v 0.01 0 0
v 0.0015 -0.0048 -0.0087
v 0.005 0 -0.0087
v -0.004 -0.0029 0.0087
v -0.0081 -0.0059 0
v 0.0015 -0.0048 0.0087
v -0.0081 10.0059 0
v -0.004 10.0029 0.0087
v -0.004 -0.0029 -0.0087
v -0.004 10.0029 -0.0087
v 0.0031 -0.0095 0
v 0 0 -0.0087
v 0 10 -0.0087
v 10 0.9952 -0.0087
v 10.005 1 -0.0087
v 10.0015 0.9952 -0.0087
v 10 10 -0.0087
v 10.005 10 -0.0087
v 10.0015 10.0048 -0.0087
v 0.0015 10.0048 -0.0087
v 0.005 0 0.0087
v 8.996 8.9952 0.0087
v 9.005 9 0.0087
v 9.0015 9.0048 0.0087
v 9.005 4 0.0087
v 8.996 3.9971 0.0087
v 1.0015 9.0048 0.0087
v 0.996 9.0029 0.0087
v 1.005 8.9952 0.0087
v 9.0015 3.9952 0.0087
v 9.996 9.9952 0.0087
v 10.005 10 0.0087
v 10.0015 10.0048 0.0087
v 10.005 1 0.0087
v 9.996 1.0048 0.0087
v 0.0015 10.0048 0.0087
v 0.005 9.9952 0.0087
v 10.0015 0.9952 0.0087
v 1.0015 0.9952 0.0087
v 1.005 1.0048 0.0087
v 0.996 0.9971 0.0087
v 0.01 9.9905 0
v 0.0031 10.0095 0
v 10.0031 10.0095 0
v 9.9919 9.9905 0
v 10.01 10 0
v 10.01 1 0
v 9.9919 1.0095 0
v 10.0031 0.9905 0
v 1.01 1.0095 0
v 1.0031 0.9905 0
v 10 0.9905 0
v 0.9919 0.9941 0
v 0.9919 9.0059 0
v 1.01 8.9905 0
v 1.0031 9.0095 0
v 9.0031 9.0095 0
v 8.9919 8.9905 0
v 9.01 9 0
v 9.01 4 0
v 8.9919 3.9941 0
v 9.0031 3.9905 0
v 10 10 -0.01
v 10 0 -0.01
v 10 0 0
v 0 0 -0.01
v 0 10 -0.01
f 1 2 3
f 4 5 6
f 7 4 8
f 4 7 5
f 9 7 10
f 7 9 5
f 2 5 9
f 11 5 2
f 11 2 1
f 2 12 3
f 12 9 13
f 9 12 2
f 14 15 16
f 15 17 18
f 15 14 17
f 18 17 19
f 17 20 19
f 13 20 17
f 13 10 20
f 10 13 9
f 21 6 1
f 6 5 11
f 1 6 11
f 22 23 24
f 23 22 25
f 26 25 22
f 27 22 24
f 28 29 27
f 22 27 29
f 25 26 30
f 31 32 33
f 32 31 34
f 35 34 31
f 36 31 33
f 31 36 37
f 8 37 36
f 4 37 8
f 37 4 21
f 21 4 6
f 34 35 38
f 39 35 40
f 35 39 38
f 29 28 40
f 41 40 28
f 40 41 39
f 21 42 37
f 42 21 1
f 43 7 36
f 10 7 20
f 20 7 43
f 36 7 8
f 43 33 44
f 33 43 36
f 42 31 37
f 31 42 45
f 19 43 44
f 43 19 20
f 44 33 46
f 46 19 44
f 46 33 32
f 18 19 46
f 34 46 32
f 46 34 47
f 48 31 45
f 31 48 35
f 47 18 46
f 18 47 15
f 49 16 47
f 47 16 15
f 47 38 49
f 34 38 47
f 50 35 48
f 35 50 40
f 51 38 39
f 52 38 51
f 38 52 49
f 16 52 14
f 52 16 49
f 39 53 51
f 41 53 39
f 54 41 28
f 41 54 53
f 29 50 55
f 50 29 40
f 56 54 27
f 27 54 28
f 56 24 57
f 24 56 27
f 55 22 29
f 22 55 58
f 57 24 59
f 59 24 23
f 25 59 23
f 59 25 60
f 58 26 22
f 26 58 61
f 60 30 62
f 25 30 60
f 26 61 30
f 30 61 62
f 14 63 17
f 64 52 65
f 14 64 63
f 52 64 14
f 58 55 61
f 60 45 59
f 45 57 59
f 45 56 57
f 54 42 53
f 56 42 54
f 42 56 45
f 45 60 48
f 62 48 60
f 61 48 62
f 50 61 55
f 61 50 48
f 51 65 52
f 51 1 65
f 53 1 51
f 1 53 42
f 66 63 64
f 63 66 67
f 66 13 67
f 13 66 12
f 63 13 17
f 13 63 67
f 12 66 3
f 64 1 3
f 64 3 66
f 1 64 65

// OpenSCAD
hull(){
    translate([0.0, 0.0]) sphere(0.01);
    translate([0.0, 1.0]) sphere(0.01);
}
hull(){
    translate([0.0, 1.0]) sphere(0.01);
    translate([0.0, 2.0]) sphere(0.01);
}
hull(){
    translate([0.0, 2.0]) sphere(0.01);
    translate([0.0, 3.0]) sphere(0.01);
}
hull(){
    translate([0.0, 3.0]) sphere(0.01);
    translate([0.0, 4.0]) sphere(0.01);
}
hull(){
    translate([0.0, 4.0]) sphere(0.01);
    translate([0.0, 5.0]) sphere(0.01);
}
hull(){
    translate([0.0, 5.0]) sphere(0.01);
    translate([0.0, 6.0]) sphere(0.01);
}
hull(){
    translate([0.0, 6.0]) sphere(0.01);
    translate([0.0, 7.0]) sphere(0.01);
}
hull(){
    translate([0.0, 7.0]) sphere(0.01);
    translate([0.0, 8.0]) sphere(0.01);
}
hull(){
    translate([0.0, 8.0]) sphere(0.01);
    translate([0.0, 9.0]) sphere(0.01);
}
hull(){
    translate([0.0, 9.0]) sphere(0.01);
    translate([0.0, 10.0]) sphere(0.01);
}
hull(){
    translate([0.0, 10.0]) sphere(0.01);
    translate([1.0, 10.0]) sphere(0.01);
}
hull(){
    translate([1.0, 10.0]) sphere(0.01);
    translate([2.0, 10.0]) sphere(0.01);
}
hull(){
    translate([2.0, 10.0]) sphere(0.01);
    translate([3.0, 10.0]) sphere(0.01);
}
hull(){
    translate([3.0, 10.0]) sphere(0.01);
    translate([4.0, 10.0]) sphere(0.01);
}
hull(){
    translate([4.0, 10.0]) sphere(0.01);
    translate([5.0, 10.0]) sphere(0.01);
}
hull(){
    translate([5.0, 10.0]) sphere(0.01);
    translate([6.0, 10.0]) sphere(0.01);
}
hull(){
    translate([6.0, 10.0]) sphere(0.01);
    translate([7.0, 10.0]) sphere(0.01);
}
hull(){
    translate([7.0, 10.0]) sphere(0.01);
    translate([8.0, 10.0]) sphere(0.01);
}
hull(){
    translate([8.0, 10.0]) sphere(0.01);
    translate([9.0, 10.0]) sphere(0.01);
}
hull(){
    translate([9.0, 10.0]) sphere(0.01);
    translate([10.0, 10.0]) sphere(0.01);
}
hull(){
    translate([10.0, 10.0]) sphere(0.01);
    translate([10.0, 9.0]) sphere(0.01);
}
hull(){
    translate([10.0, 9.0]) sphere(0.01);
    translate([10.0, 8.0]) sphere(0.01);
}
hull(){
    translate([10.0, 8.0]) sphere(0.01);
    translate([10.0, 7.0]) sphere(0.01);
}
hull(){
    translate([10.0, 7.0]) sphere(0.01);
    translate([10.0, 6.0]) sphere(0.01);
}
hull(){
    translate([10.0, 6.0]) sphere(0.01);
    translate([10.0, 5.0]) sphere(0.01);
}
hull(){
    translate([10.0, 5.0]) sphere(0.01);
    translate([10.0, 4.0]) sphere(0.01);
}
hull(){
    translate([10.0, 4.0]) sphere(0.01);
    translate([10.0, 3.0]) sphere(0.01);
}
hull(){
    translate([10.0, 3.0]) sphere(0.01);
    translate([10.0, 2.0]) sphere(0.01);
}
hull(){
    translate([10.0, 2.0]) sphere(0.01);
    translate([10.0, 1.0]) sphere(0.01);
}
hull(){
    translate([10.0, 1.0]) sphere(0.01);
    translate([9.0, 1.0]) sphere(0.01);
}
hull(){
    translate([9.0, 1.0]) sphere(0.01);
    translate([8.0, 1.0]) sphere(0.01);
}
hull(){
    translate([8.0, 1.0]) sphere(0.01);
    translate([7.0, 1.0]) sphere(0.01);
}
hull(){
    translate([7.0, 1.0]) sphere(0.01);
    translate([6.0, 1.0]) sphere(0.01);
}
hull(){
    translate([6.0, 1.0]) sphere(0.01);
    translate([5.0, 1.0]) sphere(0.01);
}
hull(){
    translate([5.0, 1.0]) sphere(0.01);
    translate([4.0, 1.0]) sphere(0.01);
}
hull(){
    translate([4.0, 1.0]) sphere(0.01);
    translate([3.0, 1.0]) sphere(0.01);
}
hull(){
    translate([3.0, 1.0]) sphere(0.01);
    translate([2.0, 1.0]) sphere(0.01);
}
hull(){
    translate([2.0, 1.0]) sphere(0.01);
    translate([1.0, 1.0]) sphere(0.01);
}
hull(){
    translate([1.0, 1.0]) sphere(0.01);
    translate([1.0, 2.0]) sphere(0.01);
}
hull(){
    translate([1.0, 2.0]) sphere(0.01);
    translate([1.0, 3.0]) sphere(0.01);
}
hull(){
    translate([1.0, 3.0]) sphere(0.01);
    translate([1.0, 4.0]) sphere(0.01);
}
hull(){
    translate([1.0, 4.0]) sphere(0.01);
    translate([1.0, 5.0]) sphere(0.01);
}
hull(){
    translate([1.0, 5.0]) sphere(0.01);
    translate([1.0, 6.0]) sphere(0.01);
}
hull(){
    translate([1.0, 6.0]) sphere(0.01);
    translate([1.0, 7.0]) sphere(0.01);
}
hull(){
    translate([1.0, 7.0]) sphere(0.01);
    translate([1.0, 8.0]) sphere(0.01);
}
hull(){
    translate([1.0, 8.0]) sphere(0.01);
    translate([1.0, 9.0]) sphere(0.01);
}
hull(){
    translate([1.0, 9.0]) sphere(0.01);
    translate([2.0, 9.0]) sphere(0.01);
}
hull(){
    translate([2.0, 9.0]) sphere(0.01);
    translate([3.0, 9.0]) sphere(0.01);
}
hull(){
    translate([3.0, 9.0]) sphere(0.01);
    translate([4.0, 9.0]) sphere(0.01);
}
hull(){
    translate([4.0, 9.0]) sphere(0.01);
    translate([5.0, 9.0]) sphere(0.01);
}
hull(){
    translate([5.0, 9.0]) sphere(0.01);
    translate([6.0, 9.0]) sphere(0.01);
}
hull(){
    translate([6.0, 9.0]) sphere(0.01);
    translate([7.0, 9.0]) sphere(0.01);
}
hull(){
    translate([7.0, 9.0]) sphere(0.01);
    translate([8.0, 9.0]) sphere(0.01);
}
hull(){
    translate([8.0, 9.0]) sphere(0.01);
    translate([9.0, 9.0]) sphere(0.01);
}
hull(){
    translate([9.0, 9.0]) sphere(0.01);
    translate([9.0, 8.0]) sphere(0.01);
}
hull(){
    translate([9.0, 8.0]) sphere(0.01);
    translate([9.0, 7.0]) sphere(0.01);
}
hull(){
    translate([9.0, 7.0]) sphere(0.01);
    translate([9.0, 6.0]) sphere(0.01);
}
hull(){
    translate([9.0, 6.0]) sphere(0.01);
    translate([9.0, 5.0]) sphere(0.01);
}
hull(){
    translate([9.0, 5.0]) sphere(0.01);
    translate([9.0, 4.0]) sphere(0.01);
}
translate([0,0,-0.01]) color([0.1,0.1,0.1]) cube([10,10,0.01]);
